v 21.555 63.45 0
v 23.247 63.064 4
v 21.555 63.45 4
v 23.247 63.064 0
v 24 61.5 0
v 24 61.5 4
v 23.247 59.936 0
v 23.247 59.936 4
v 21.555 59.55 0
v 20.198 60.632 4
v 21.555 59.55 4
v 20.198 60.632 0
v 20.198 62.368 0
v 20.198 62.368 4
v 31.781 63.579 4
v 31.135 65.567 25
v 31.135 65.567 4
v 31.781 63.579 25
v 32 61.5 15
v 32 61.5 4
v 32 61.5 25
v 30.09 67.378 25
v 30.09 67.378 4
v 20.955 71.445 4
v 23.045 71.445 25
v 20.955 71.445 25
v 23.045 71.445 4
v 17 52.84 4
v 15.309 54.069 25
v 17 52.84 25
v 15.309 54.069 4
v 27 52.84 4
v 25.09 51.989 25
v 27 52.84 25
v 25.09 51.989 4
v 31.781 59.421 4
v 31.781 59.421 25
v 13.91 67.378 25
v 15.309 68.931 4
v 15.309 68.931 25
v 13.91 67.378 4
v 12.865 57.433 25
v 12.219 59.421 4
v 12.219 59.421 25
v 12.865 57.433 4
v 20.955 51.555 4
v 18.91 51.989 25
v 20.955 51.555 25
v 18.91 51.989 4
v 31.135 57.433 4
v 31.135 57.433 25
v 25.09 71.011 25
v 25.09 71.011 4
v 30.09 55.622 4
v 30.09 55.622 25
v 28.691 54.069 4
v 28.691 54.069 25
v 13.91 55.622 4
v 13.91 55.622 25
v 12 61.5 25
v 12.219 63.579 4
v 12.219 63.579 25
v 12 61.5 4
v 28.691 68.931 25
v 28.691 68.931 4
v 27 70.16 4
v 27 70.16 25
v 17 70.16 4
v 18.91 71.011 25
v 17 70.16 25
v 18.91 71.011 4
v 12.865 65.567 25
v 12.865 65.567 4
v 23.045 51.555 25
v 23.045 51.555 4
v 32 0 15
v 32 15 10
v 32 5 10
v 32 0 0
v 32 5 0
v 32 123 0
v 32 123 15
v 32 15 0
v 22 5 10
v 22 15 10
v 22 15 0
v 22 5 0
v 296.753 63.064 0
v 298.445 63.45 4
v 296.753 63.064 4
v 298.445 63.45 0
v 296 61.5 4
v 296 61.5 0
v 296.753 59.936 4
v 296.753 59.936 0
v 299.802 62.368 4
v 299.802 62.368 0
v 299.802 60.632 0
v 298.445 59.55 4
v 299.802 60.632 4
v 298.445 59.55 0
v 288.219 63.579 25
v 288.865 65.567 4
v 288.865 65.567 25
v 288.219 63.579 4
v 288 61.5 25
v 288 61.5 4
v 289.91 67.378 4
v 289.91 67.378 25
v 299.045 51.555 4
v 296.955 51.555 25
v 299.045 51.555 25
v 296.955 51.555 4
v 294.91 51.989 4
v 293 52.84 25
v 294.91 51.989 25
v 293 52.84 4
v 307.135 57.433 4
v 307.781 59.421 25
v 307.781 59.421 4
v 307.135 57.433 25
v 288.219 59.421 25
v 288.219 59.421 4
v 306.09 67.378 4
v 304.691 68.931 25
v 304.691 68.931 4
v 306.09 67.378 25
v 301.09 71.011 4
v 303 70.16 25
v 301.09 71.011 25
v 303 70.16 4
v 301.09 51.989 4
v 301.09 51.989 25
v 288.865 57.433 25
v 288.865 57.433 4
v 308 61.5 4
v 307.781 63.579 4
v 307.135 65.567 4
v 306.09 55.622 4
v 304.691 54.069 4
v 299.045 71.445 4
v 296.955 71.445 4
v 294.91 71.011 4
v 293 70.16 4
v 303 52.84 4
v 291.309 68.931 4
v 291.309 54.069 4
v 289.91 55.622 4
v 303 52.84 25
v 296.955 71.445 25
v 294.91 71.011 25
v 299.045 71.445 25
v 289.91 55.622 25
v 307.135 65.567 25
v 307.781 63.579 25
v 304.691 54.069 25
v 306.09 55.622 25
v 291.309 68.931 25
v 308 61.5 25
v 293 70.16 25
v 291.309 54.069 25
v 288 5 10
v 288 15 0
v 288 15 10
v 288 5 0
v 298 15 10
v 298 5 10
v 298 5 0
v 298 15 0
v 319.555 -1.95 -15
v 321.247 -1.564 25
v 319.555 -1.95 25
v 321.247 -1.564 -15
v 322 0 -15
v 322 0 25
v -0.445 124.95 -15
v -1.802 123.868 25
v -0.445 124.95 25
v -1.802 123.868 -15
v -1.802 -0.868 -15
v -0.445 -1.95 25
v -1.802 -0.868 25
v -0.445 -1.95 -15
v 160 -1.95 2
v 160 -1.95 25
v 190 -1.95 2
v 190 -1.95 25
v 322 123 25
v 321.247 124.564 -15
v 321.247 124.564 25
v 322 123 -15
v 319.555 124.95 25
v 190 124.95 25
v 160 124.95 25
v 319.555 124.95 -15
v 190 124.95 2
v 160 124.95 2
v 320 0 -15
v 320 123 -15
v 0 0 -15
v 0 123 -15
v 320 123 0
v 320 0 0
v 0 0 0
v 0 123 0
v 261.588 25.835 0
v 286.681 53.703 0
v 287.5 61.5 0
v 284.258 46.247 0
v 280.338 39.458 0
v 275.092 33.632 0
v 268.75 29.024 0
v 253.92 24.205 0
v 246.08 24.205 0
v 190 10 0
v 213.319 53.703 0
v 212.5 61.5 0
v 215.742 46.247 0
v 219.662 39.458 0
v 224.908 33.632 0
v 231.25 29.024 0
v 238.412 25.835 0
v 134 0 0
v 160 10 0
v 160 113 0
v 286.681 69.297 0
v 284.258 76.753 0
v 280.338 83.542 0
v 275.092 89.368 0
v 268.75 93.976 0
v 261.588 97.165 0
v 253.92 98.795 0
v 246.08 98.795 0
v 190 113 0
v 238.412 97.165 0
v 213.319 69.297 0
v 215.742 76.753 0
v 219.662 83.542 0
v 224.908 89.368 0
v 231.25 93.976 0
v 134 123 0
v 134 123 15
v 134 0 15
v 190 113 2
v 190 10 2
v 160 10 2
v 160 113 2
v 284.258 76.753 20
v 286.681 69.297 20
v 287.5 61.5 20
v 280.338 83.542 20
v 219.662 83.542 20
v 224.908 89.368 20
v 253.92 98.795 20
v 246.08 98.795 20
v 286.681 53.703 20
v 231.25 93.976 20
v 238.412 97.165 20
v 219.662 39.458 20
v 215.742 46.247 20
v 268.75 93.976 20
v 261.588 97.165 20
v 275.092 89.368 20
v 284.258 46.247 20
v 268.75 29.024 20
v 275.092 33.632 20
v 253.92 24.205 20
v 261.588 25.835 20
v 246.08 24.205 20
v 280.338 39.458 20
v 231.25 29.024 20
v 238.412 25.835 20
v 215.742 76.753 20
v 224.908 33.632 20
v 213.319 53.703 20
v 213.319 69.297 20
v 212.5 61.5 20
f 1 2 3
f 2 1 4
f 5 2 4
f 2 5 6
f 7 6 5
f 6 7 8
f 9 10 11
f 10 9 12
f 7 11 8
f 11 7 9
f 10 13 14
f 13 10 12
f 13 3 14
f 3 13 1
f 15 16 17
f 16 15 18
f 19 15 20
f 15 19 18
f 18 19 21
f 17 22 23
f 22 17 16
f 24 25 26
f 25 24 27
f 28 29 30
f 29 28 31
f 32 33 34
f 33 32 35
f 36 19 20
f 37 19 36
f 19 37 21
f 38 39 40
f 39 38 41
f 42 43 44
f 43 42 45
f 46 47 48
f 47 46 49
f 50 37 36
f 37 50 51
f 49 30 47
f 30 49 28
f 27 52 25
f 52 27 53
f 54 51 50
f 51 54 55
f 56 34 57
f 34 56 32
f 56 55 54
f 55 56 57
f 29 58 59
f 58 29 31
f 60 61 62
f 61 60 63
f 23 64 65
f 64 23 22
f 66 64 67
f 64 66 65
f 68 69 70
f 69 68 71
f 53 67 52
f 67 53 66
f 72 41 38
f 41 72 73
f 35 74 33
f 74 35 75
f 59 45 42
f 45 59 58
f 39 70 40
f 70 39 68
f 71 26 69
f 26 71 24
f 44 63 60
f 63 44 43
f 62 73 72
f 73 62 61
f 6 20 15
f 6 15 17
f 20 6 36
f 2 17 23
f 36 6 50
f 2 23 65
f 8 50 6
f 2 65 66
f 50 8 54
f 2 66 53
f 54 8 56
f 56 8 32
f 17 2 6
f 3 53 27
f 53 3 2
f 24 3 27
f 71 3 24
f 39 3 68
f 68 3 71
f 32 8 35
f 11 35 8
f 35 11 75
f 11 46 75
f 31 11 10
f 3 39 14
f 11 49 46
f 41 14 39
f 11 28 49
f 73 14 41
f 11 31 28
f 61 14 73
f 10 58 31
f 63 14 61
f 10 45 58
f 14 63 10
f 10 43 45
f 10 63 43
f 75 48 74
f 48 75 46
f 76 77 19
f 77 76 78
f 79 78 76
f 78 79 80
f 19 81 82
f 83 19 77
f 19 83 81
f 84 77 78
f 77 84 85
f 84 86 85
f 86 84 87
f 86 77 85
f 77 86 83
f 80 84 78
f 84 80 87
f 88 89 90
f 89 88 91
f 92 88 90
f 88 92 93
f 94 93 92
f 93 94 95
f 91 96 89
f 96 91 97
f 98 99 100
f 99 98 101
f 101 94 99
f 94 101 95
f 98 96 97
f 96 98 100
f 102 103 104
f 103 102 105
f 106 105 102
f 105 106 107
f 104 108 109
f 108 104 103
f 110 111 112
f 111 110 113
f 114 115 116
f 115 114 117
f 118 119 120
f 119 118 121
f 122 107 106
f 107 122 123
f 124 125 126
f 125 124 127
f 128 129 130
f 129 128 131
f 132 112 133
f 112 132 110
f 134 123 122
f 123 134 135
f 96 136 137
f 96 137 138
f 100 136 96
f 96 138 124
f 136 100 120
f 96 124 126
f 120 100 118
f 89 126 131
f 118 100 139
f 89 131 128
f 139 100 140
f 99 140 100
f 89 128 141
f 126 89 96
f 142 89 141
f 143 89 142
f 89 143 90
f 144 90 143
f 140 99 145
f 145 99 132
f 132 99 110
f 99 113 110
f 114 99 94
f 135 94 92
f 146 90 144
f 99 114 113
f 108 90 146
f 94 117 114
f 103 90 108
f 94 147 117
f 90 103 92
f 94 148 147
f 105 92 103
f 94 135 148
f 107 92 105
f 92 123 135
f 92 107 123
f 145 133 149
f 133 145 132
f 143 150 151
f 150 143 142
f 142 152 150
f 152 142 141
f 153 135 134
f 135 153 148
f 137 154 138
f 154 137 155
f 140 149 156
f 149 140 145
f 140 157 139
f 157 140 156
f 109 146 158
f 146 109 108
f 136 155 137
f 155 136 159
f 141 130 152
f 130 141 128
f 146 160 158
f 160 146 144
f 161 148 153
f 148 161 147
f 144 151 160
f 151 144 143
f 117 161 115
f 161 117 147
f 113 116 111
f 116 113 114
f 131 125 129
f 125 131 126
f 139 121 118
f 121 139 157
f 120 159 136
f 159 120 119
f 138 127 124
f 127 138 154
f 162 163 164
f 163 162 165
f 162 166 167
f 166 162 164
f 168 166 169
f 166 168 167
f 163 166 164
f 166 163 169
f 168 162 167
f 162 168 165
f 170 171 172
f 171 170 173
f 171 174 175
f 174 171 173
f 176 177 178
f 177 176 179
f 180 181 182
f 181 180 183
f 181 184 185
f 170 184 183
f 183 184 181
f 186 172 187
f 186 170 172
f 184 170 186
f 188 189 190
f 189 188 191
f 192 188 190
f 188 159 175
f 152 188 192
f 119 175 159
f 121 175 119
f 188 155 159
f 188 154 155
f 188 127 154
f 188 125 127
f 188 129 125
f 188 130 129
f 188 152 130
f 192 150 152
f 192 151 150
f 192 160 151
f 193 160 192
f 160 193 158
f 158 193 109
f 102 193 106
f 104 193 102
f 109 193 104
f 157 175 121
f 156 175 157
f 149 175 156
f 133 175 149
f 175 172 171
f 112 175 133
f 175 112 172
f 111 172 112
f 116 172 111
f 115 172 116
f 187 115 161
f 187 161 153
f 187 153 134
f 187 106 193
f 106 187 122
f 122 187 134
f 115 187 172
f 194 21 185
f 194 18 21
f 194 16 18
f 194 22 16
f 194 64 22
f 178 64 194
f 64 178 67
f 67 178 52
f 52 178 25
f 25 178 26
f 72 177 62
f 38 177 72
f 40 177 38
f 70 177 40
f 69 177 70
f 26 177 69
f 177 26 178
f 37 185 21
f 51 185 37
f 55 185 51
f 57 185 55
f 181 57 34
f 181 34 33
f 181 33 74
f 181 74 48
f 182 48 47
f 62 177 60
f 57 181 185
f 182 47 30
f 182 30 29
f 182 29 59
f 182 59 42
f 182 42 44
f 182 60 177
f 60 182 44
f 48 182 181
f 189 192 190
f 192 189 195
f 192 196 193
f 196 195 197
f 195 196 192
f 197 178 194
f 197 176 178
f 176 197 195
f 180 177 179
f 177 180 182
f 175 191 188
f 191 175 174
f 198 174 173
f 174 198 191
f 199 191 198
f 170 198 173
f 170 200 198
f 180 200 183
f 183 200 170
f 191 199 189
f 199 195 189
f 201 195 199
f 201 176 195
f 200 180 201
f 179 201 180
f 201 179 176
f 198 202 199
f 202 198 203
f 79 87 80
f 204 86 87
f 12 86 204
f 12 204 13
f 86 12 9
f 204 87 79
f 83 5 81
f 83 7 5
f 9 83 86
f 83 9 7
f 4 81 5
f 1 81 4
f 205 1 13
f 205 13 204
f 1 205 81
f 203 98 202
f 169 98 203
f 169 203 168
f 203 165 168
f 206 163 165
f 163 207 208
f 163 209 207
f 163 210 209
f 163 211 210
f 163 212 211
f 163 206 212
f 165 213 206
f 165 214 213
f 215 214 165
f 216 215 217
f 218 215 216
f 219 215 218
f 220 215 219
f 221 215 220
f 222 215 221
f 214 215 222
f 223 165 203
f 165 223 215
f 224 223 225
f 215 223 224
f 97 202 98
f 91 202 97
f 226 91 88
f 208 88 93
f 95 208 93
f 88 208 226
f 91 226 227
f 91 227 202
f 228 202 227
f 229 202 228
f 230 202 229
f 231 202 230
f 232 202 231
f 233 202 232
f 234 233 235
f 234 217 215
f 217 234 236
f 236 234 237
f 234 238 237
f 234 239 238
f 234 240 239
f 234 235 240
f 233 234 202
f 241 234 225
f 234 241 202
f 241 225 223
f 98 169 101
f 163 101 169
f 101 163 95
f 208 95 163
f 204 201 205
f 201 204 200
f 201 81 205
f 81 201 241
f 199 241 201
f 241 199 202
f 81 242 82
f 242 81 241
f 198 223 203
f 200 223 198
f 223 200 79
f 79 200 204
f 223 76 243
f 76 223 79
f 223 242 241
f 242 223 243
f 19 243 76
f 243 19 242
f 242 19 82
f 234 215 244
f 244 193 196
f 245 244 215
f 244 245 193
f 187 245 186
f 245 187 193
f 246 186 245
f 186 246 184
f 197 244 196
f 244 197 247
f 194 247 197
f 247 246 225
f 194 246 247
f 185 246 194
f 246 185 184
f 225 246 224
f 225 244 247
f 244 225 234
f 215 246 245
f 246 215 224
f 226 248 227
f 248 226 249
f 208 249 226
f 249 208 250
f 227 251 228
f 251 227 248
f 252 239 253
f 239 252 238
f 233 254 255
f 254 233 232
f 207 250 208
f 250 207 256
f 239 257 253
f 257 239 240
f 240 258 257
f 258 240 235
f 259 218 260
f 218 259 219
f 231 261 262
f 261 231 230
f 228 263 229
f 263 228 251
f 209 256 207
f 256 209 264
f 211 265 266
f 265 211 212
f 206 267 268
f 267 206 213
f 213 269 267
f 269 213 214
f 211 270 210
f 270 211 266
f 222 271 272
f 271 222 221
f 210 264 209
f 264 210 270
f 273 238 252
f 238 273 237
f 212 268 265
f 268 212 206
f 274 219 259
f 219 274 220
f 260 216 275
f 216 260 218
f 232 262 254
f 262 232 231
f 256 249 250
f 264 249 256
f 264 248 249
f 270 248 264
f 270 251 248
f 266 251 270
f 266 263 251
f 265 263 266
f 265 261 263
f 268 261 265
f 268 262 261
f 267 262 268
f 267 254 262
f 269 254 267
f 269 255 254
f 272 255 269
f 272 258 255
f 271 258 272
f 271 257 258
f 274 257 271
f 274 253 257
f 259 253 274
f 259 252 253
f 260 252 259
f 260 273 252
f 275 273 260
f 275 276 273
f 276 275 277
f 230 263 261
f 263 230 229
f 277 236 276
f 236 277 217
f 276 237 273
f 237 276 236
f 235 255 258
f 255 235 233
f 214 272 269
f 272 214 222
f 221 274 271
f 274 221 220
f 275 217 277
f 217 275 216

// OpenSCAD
base_width = 320.0;  // measured mm
base_height = 123.0;  // measured mm
sleeve_depth = 15.0;  // chosen, overkill
general_thickness = 2.0;  // chosen
back_face_depth = 25.0;  // chosen

mounting_screw_x_inset = 22;  // measured
mounting_screw_hole_diameter = 2;  // NOT MEASURED
mounting_screw_countersink_diameter = 10;  // NOT MEASURED
mounting_screw_plate_depth = 4.0;  // chosen BUT NOT WELL

hook_width = 10;  // NOT MEASURED
hook_height = 10;
hook_depth = 10;
hook_y_inset = 5;  // measured mm

plate_start = 32;   // NOT MEASURED
plate_end = 134;  // measured mm
plate_depth = 15;  // NOT MEASURED

line_cord_start = 160.0;
line_cord_end = 190.0;
line_cord_y_clearance = 10.0;

crt_diameter = 70;  // measured mm, not used
crt_clearance_diameter = 75;  // picked
crt_depth = 10;  // measured mm, not used
crt_clearance_depth = 20;  // picked
crt_center_from_left = base_width - 70;  // measured mm

epsilon = 1.0;
total_depth = sleeve_depth + back_face_depth;

module left_mounting_screw_negative() {
    translate([mounting_screw_x_inset, base_height / 2, -epsilon]) cylinder(r=mounting_screw_hole_diameter, h=total_depth);

    // countersink 
    translate([mounting_screw_x_inset, base_height / 2, mounting_screw_plate_depth]) cylinder(r=mounting_screw_countersink_diameter, h=total_depth);
    
    // mounting hook
    translate([mounting_screw_x_inset, hook_y_inset, -epsilon]) cube([hook_width, hook_height, hook_depth + epsilon]);
}

difference() {
    // sleeve & surround
    translate([0, 0, -sleeve_depth])
    minkowski() {
        cube([base_width, base_height, total_depth / 2]);
        cylinder(r=general_thickness, h=total_depth / 2);  // TODO heights are kludge
    }
    // hollow in sleeve for main body
    color("white")
    translate([0, 0, -sleeve_depth - epsilon])
      cube([base_width, base_height, sleeve_depth + epsilon]);
    
    // mounting screws & matching things
    left_mounting_screw_negative();
    translate([base_width, 0, 0]) mirror([1, 0, 0]) left_mounting_screw_negative();
    
    // power transformer plate
    translate([plate_start, 0, -epsilon]) cube([plate_end - plate_start, base_height, plate_depth + epsilon]);
    
    // thinning out line cord area
    translate([line_cord_start, -2*general_thickness, general_thickness]) cube([line_cord_end - line_cord_start, base_height + 4*general_thickness, back_face_depth + epsilon]);
    
    // hole punch for line cord (NOT MEASURED IN ENOUGH DETAIL)
    translate([line_cord_start, line_cord_y_clearance, -epsilon]) cube([line_cord_end - line_cord_start, base_height - line_cord_y_clearance * 2, back_face_depth + epsilon]);
    
    // CRT end
    translate([crt_center_from_left, base_height / 2, -epsilon])
        cylinder(r=crt_clearance_diameter / 2, h=crt_clearance_depth + epsilon);
    
    // metal plate (assumed transformer mount) end)
    translate([plate_start, 0, 0]) cube([plate_end - plate_start, 0, plate_depth]);
    
    // TODO: spaces for those screws in one corner
    // TODO: holes for side-panel screws (do they pass through or do they need slide-in clearance?
    // TODO: spaces for those upper side plastic frame tabs
    // TODO: ventilation slots
}
